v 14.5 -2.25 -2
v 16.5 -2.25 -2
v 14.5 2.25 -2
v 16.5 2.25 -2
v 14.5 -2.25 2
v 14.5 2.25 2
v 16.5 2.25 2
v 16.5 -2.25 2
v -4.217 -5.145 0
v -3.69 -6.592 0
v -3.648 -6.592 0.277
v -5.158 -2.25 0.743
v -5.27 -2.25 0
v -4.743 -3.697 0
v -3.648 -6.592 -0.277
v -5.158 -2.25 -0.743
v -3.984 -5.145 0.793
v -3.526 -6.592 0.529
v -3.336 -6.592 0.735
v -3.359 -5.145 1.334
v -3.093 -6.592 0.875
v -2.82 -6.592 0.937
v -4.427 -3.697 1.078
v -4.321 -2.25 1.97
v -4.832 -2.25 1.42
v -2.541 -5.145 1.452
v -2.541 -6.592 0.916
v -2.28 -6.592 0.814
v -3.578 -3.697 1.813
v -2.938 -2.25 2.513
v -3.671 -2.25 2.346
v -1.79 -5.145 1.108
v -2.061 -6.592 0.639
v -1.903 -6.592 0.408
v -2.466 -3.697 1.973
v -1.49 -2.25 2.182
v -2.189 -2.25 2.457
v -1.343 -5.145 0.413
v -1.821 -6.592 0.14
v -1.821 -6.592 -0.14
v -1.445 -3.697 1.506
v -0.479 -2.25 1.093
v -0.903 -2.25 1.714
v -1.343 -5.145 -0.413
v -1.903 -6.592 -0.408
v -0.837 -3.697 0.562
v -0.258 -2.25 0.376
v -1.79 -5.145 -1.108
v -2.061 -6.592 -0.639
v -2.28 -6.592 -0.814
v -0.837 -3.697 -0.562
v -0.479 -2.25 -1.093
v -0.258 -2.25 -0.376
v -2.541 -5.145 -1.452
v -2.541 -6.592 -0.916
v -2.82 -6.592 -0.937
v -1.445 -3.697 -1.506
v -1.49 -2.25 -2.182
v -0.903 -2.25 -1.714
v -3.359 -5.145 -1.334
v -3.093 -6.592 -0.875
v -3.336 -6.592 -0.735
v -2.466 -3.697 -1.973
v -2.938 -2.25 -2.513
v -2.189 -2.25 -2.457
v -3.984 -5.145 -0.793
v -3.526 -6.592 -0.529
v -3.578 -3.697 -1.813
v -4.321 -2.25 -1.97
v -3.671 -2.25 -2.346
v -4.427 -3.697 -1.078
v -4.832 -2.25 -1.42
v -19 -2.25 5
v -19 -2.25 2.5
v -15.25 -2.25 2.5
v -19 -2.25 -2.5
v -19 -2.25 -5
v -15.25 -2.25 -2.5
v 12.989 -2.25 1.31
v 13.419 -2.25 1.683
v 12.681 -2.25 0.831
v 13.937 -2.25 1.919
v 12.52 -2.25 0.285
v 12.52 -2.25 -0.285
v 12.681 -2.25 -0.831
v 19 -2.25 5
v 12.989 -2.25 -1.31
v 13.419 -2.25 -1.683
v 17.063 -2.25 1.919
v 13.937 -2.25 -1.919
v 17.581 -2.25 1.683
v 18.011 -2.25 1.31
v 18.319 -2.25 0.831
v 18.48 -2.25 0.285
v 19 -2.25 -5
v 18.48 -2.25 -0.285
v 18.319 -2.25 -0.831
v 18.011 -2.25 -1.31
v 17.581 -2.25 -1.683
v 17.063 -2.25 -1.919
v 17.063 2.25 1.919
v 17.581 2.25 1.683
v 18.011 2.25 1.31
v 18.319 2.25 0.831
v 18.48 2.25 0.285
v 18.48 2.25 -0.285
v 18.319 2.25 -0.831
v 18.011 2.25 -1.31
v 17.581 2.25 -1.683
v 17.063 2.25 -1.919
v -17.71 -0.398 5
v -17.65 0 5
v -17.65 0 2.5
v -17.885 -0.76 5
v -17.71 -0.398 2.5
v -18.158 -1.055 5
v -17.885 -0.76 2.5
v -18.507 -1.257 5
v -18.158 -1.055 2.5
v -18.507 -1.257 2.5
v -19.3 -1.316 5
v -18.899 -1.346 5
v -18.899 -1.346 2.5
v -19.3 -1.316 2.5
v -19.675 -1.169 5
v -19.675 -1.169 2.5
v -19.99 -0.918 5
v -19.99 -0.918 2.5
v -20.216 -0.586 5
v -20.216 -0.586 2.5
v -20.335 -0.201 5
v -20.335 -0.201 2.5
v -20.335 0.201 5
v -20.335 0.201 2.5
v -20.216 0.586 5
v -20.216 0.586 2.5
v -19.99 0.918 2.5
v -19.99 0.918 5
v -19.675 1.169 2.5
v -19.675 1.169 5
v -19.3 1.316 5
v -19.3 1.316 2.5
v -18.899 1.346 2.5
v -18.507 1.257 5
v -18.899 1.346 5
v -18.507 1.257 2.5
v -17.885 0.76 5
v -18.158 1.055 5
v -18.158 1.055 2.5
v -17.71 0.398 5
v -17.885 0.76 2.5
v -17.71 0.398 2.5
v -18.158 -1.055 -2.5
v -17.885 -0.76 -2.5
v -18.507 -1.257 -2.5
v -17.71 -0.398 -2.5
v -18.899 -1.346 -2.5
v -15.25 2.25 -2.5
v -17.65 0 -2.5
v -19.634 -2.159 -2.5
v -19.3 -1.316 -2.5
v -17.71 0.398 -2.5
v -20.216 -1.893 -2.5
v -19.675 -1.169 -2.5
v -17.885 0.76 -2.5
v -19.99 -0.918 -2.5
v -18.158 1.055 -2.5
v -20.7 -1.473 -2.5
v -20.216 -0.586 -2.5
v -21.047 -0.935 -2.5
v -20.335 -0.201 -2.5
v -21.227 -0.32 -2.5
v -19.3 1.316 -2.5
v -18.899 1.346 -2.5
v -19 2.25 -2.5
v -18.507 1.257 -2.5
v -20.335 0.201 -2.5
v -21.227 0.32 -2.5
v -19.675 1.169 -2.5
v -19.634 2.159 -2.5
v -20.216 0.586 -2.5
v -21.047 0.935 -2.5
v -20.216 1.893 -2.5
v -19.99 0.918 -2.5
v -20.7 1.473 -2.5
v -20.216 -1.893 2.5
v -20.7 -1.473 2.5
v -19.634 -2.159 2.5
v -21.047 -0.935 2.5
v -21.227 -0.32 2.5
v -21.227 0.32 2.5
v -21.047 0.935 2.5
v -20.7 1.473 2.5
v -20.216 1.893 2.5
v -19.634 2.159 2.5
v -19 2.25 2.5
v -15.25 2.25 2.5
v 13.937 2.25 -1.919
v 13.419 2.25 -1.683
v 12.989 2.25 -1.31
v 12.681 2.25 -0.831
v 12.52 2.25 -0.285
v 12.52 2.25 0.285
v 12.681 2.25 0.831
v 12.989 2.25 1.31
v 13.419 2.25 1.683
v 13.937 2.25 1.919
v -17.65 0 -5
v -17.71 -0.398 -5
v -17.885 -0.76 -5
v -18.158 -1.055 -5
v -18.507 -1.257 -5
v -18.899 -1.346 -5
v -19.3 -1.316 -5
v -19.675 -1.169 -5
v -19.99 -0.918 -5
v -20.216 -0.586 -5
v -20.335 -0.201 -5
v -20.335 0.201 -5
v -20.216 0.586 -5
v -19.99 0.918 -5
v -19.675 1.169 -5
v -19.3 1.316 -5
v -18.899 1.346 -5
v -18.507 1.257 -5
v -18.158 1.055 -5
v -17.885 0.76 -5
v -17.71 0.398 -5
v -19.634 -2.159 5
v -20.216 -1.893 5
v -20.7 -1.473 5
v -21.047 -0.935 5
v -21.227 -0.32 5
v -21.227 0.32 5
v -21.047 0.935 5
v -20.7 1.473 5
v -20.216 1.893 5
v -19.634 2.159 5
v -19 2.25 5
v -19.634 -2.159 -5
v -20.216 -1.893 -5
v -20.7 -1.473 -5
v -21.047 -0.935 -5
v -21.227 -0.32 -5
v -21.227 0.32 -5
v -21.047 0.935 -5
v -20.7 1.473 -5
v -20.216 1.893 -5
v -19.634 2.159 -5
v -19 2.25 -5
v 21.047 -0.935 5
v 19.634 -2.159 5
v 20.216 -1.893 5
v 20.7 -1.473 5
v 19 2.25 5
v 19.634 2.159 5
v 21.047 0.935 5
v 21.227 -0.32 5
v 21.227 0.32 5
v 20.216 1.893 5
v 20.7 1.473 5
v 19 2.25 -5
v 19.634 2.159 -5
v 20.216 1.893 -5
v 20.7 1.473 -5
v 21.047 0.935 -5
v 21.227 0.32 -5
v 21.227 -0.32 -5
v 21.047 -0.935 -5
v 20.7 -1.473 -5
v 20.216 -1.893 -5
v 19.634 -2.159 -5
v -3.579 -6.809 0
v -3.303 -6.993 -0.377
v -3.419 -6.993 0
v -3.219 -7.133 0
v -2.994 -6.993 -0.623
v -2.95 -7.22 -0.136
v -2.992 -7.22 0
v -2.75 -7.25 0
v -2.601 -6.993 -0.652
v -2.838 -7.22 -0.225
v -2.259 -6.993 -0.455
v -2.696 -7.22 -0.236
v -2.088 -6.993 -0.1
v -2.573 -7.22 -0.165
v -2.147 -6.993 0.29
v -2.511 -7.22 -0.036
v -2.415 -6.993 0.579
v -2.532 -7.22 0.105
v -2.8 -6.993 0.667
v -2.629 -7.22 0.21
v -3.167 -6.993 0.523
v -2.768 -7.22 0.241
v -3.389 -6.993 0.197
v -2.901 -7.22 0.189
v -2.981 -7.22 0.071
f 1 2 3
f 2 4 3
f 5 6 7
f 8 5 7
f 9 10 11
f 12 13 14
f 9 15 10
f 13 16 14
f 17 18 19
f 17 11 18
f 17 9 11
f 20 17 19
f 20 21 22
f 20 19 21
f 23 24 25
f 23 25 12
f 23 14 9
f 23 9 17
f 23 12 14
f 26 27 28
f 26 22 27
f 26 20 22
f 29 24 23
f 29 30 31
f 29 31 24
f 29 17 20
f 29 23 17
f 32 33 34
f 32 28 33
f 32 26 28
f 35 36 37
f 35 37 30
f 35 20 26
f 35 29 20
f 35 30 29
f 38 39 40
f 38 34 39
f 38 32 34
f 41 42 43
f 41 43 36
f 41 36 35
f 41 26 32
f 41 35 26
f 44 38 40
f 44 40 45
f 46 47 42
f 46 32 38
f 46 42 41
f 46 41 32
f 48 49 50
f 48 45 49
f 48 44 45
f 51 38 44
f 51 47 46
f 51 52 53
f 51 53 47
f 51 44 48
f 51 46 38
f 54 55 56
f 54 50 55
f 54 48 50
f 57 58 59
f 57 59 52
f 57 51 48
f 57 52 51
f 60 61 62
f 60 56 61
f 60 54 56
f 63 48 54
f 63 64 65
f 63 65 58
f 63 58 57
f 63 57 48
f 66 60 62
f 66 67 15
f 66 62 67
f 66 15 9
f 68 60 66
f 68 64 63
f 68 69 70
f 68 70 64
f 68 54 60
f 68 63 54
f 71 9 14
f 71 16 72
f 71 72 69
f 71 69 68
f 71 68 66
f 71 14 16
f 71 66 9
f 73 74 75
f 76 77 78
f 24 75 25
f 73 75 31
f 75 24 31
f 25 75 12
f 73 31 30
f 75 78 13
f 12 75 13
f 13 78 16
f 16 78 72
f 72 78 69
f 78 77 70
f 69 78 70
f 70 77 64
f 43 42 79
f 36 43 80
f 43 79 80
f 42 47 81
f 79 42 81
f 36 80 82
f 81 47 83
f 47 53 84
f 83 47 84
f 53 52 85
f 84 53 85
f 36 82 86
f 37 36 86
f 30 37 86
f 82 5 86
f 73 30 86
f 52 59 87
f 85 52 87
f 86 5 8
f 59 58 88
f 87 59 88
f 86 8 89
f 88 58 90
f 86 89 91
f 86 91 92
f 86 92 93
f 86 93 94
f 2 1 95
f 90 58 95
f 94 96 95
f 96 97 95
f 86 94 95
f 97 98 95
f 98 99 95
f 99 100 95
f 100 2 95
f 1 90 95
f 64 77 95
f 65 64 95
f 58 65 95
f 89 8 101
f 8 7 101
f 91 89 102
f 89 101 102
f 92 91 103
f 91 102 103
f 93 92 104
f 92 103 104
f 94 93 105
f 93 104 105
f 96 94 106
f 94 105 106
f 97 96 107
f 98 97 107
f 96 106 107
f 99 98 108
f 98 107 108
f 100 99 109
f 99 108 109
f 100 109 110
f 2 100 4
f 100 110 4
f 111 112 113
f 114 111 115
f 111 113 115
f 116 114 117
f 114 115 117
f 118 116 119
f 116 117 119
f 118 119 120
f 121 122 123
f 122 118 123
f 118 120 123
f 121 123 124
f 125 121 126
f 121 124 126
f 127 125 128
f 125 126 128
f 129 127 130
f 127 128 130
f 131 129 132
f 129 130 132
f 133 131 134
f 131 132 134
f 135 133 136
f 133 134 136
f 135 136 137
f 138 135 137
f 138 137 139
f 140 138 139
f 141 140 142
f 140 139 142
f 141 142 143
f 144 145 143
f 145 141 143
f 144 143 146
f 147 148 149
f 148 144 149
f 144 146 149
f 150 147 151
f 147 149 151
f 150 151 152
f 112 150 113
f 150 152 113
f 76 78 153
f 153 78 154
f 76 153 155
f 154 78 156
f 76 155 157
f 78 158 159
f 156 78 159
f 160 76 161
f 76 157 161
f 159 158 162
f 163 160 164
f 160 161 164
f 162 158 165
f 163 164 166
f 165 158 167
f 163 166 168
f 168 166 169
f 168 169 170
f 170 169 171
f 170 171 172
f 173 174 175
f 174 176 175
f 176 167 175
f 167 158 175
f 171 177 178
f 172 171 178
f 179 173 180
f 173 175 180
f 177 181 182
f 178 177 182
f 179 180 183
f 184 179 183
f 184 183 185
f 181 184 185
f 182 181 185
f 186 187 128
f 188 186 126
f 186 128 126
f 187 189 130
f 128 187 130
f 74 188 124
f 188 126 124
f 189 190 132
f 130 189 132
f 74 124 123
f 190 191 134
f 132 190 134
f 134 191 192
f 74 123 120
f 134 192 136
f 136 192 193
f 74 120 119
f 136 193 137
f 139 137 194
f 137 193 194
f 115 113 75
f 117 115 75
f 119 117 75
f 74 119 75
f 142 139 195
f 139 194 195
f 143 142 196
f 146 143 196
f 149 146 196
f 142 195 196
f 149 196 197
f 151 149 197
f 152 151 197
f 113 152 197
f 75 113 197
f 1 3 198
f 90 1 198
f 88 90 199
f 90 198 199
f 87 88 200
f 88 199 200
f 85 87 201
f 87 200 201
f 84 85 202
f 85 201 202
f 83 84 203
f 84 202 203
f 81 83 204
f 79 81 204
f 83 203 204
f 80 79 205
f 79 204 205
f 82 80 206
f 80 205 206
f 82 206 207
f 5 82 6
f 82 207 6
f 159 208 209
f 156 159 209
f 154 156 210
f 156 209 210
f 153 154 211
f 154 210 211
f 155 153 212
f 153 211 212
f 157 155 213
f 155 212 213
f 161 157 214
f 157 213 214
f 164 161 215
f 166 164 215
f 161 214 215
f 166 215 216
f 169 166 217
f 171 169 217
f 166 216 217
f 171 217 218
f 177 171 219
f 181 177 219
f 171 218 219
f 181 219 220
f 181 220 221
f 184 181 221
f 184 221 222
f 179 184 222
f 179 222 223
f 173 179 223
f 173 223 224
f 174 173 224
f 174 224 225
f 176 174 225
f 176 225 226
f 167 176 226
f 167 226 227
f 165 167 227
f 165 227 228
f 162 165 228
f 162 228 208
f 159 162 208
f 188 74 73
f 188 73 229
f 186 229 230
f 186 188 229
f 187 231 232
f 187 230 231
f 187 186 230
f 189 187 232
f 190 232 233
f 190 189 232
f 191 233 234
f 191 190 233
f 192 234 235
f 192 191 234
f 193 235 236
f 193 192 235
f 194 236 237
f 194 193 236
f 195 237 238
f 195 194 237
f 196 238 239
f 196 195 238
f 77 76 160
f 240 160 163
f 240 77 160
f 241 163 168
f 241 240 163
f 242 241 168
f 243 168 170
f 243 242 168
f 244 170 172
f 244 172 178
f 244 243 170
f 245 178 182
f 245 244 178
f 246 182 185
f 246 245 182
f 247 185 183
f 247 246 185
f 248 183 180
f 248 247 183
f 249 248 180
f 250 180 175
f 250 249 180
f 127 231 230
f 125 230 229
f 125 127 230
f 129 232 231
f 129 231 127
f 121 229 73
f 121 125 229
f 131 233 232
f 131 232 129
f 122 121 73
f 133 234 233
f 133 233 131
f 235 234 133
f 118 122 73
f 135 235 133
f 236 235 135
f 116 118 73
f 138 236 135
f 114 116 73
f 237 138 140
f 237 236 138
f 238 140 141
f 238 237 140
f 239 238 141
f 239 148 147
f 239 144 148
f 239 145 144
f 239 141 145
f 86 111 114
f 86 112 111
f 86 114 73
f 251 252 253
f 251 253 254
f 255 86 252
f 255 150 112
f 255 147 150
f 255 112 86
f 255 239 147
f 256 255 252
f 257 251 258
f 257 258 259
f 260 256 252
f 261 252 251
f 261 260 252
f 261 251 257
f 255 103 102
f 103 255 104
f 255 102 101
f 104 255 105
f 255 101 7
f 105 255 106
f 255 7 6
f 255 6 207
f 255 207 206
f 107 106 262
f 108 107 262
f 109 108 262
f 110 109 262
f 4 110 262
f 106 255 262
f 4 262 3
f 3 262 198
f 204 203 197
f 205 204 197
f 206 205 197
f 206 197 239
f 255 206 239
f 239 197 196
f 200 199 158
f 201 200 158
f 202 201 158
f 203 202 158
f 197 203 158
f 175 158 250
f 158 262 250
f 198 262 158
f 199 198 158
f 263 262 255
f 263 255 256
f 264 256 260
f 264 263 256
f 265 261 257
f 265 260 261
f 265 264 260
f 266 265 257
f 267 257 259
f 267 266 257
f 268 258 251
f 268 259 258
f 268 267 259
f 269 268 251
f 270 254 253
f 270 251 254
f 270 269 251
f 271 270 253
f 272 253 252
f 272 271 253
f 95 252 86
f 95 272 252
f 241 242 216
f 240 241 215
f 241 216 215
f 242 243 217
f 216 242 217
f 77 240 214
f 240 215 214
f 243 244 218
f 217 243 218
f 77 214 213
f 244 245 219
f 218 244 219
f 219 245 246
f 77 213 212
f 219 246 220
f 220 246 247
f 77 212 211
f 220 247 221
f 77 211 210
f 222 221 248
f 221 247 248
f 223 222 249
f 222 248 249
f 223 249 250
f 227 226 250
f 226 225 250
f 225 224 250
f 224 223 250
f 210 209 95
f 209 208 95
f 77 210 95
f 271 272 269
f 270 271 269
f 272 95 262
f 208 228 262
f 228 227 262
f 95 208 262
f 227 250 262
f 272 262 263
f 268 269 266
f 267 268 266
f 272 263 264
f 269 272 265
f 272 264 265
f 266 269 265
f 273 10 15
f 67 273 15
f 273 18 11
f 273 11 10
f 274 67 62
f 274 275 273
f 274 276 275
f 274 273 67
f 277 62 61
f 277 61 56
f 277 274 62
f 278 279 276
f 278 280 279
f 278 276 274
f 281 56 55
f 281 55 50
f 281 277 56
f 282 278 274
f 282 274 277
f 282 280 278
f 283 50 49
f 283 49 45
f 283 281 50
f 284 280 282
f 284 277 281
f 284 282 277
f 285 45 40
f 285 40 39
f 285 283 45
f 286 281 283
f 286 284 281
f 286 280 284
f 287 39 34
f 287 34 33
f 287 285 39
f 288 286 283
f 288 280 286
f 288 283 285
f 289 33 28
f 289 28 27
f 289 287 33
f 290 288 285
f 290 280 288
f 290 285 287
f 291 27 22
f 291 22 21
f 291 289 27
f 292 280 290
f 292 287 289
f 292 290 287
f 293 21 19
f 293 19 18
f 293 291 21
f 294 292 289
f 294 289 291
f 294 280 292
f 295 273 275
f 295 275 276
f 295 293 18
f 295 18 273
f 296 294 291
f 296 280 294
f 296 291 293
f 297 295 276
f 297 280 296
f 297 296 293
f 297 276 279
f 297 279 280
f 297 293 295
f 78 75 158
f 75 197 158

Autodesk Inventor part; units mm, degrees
ref_plane "YZ Plane" through (0, 0, 0) normal (1, 0, 0) x (0, 1, 0)
ref_plane "XZ Plane" through (0, 0, 0) normal (0, 1, 0) x (-1, 0, 0)
ref_plane "XY Plane" through (0, 0, 0) normal (0, 0, 1) x (1, 0, 0)
sketch "Sketch1" plane through (0, 0, 0) normal (0, 0, 1) x (1, 0, 0)
  line L0 (-19, 0) -> (19, 0) construction
  line L1 (-19, -2.25) -> (19, -2.25)
  line L2 (19, 2.25) -> (-19, 2.25)
  arc A0 (-19, 2.25) -> (-19, -2.25) centre (-19, 0) ccw
  arc A1 (19, -2.25) -> (19, 2.25) centre (19, 0) ccw
  circle A2 centre (-19, 0) radius 1.35
  point P0 (0, 0)
  dimension "d0" = 4.5
  dimension "d1" = 38
  dimension "d8" = 2.7
extrude "Extrusion1" add sketch "Sketch1" along normal mid plane 10
sketch "Sketch2" plane through (-19, 2.25, -5) normal (0, 1, 0) x (1, 0, 0)
  line L0 (-8.25, -7.5) -> (3.75, -7.5)
  line L1 (3.75, -7.5) -> (3.75, -2.5)
  line L2 (3.75, -2.5) -> (-8.25, -2.5)
  line L3 (-8.25, -2.5) -> (-8.25, -7.5)
  line L4 (-2.25, 0) -> (-2.25, -10) projected
  line L5 (-8.25, -7.5) -> (3.75, -2.5) construction
  line L6 (3.75, -7.5) -> (-8.25, -2.5) construction
  point P0 (19, -5)
  point P1 (-2.25, -5)
  dimension "d4" = 5
  dimension "d5" = 6
extrude "Extrusion2" cut sketch "Sketch2" against normal through all
sketch "Sketch3" plane through (-19, 2.25, -5) normal (0, 1, 0) x (1, 0, 0)
  line L0 (1.35, -10) -> (-1.35, -10) construction
  line L1 (-1.35, 0) -> (1.35, 0) construction
  line L2 (0, -7.5) -> (0, -10) construction
  line L3 (0, -10) -> (0, 0) construction
  line L4 (0, -5) -> (34.5, -5) construction
  line L5 (35.5, -5) -> (33.5, -5) construction
  line L6 (35.5, -3) -> (33.5, -3)
  line L7 (33.5, -7) -> (35.5, -7)
  arc A0 (35.5, -7) -> (35.5, -3) centre (35.5, -5) ccw
  arc A1 (33.5, -3) -> (33.5, -7) centre (33.5, -5) ccw
  point P0 (19, -5)
  dimension "d9" = 34.5
  dimension "d11" = 2
  dimension "d12" = 2
extrude "Extrusion3" cut sketch "Sketch3" against normal through all
sketch "Sketch4" plane through (0, 0, 0) normal (0, 0, 1) x (1, 0, 0)
  line L0 (-19, -2.25) -> (19, -2.25) projected
  line L1 (-2.75, -2.25) -> (-2.75, -7.25)
  line L2 (-3.6897, -6.592) -> (-5.2701, -2.25)
  arc A0 (-3.6897, -6.592) -> (-2.75, -7.25) centre (-2.75, -6.25) ccw
  circle A1 centre (-19, 0) radius 1.35 projected
  point P0 (0, 0)
  dimension "d15" = 1
  dimension "d16" = 70
  dimension "d18" = 16.25
  dimension "d21" = 5
revolve "Revolution1" add sketch "Sketch4" angle 360 about axis through (-2.75, -2.25, 0) along (0, -1, 0) contours L0 L1 A0 L2
sketch "Sketch5" plane through (-19, 2.25, 5) normal (0, 1, 0) x (1, 0, 0)
  line L0 (42.5072, 5) -> (-11.8612, 5)
  line L1 (-11.8612, 5) -> (-11.8612, 14.1834)
  line L2 (-11.8612, 14.1834) -> (42.5072, 14.1834)
  line L3 (42.5072, 14.1834) -> (42.5072, 5)
  point P0 (19, 5)
properties part number "RegulatorHinge"
